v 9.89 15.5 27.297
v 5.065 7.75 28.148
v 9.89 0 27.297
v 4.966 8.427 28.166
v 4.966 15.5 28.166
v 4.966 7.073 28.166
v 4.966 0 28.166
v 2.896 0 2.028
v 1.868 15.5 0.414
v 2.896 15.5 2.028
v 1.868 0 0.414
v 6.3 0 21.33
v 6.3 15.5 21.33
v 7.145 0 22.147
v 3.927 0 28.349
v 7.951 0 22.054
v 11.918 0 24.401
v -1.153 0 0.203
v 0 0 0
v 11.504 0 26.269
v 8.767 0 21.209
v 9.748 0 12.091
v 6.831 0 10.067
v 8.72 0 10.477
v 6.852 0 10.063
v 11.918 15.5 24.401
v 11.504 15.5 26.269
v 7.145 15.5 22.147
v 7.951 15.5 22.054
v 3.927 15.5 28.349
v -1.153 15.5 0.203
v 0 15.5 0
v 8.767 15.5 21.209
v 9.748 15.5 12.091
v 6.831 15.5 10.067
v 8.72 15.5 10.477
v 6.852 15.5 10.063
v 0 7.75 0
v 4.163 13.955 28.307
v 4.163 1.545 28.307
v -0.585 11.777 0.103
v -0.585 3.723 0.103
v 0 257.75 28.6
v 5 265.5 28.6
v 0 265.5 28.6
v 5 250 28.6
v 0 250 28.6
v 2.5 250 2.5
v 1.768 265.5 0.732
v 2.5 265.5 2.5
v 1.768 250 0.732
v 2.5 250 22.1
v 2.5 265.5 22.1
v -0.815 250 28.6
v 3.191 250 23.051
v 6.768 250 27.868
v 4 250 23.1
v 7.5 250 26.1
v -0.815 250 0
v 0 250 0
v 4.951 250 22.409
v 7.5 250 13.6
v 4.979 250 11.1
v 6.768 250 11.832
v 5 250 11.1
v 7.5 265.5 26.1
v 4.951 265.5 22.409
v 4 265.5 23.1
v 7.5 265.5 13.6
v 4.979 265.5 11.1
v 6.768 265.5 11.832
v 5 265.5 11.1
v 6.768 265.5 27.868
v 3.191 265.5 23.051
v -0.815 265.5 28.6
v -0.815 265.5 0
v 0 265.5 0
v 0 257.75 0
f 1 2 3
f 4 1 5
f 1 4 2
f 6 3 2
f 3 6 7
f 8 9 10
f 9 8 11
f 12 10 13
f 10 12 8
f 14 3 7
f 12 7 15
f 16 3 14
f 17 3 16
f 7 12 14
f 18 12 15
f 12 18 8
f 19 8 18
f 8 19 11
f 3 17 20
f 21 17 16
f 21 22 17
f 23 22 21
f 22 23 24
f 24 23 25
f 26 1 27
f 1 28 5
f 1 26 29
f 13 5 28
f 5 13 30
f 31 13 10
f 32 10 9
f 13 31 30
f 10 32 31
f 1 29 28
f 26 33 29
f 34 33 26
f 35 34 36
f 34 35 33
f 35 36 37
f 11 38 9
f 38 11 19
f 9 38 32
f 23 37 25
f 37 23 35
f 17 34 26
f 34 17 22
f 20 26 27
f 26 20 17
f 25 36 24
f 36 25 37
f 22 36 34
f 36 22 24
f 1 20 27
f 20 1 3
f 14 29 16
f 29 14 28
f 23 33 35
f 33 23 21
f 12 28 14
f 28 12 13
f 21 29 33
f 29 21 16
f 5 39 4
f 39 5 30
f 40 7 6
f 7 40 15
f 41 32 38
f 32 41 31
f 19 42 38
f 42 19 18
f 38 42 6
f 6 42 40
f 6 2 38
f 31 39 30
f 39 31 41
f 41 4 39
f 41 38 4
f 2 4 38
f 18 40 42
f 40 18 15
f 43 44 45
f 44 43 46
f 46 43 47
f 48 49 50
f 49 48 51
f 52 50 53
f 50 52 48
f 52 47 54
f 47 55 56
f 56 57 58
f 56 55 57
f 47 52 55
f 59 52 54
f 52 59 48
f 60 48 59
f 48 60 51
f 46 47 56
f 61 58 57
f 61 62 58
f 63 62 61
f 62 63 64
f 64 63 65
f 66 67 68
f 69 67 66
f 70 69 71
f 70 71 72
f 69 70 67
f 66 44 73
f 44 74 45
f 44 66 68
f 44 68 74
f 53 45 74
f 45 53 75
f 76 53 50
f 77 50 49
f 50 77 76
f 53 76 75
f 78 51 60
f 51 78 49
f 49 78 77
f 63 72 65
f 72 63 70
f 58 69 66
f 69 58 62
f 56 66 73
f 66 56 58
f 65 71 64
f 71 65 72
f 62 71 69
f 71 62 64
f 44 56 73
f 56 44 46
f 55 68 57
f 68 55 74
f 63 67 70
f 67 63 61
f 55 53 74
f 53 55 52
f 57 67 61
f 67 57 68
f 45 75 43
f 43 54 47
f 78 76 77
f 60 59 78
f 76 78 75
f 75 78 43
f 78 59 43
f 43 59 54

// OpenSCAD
wall_thickness = 2.5;
height_back = 28.6; // height of back of hook as it touches the mounting surface
depth = 2.5; // wall-to-wall internal depth
height_front = 15; // from bottom of inner bracket to top of hook
width = 15.5;
c = .2; // % of front_height to thicken bottom of hook by

//$fn=360;

r = wall_thickness;
 // radii of inside space. r or r/2 are sensible defaults
inner_bl_r = 1;
inner_br_r = 1;

module corner(r_=wall_thickness, w=width) {
    intersection() {
        cylinder(r=r_, h=w);
        cube([r_,r_,w]);
    }
}

module ul() { translate([0,height_back-r,0]) corner(); }
module bl() { translate([0,0,0]) rotate(0) corner(); }
module br() { translate([depth+r,r,0]) rotate(270) corner(); }
module ur() { translate([depth+r,height_front,0]) corner(); }

module inside() {
    translate([0,0,-0.001])
    hull() {
        translate([r+inner_bl_r,r+inner_bl_r+height_front*c,0]) rotate(180) corner(r_=inner_bl_r,w=width+0.002);
        translate([depth+(r-inner_br_r),r+inner_br_r+height_front*c,0]) rotate(270) corner(r_=inner_br_r, w=width+0.002);
        translate([2*r,height_back-r,0]) rotate(90) corner(w=width+0.002);
        translate([depth,height_back-r,0]) corner(w=width+0.002);
    }
}

module bracket() {
    difference() {
        union() {
            hull() {
                ul(); bl();
            }
            hull() {
                translate([-depth-r,0,0]) ur();
                bl(); br(); ur();
            }
        }
        inside();
    }
}


module trash_can(offset_h) {
    rim = 8.4;
    can_height = 234-8.36;
    y = offset_h;
    x = offset_h/can_height * ( 256-2*rim - 158) / 2;
    translate([rim-256/2+x,width/2,offset_h])
    hull() {
        resize([256-2*rim, 183.5-2*rim,4]) cylinder(d=183.5,h=1);
        translate([0,0,-can_height]) resize([158, 105, 4]) cylinder(d=105,h=1);
    }
}

module hook_1() {
    difference() {
        rotate([0,10,0]) union() {
            translate([0,0,height_back]) rotate([-90,0,0]) bracket();
            translate([-2,0,0]) cube([2, width, height_back]);
        }
        translate([0,0,0]) #trash_can(height_back+145);
    }
}

module trash_can_1() {
    translate([-246/2,width/2,-135 - height_back + wall_thickness])
    difference() {
        cylinder(r=246/2, h=375);
        translate([0,0,2.54]) cylinder(r=246/2-2.54, h=375-2.54+0.002);
    }
}

module hook_2() {
    difference() {
        union() {
            translate([0,0,height_back]) rotate([-90,0,0]) bracket();
            translate([-2,0,0]) cube([2, width, height_back]);
        }
        #trash_can_1();
    }
}

hook_1();
translate([0,250,0]) hook_2();
